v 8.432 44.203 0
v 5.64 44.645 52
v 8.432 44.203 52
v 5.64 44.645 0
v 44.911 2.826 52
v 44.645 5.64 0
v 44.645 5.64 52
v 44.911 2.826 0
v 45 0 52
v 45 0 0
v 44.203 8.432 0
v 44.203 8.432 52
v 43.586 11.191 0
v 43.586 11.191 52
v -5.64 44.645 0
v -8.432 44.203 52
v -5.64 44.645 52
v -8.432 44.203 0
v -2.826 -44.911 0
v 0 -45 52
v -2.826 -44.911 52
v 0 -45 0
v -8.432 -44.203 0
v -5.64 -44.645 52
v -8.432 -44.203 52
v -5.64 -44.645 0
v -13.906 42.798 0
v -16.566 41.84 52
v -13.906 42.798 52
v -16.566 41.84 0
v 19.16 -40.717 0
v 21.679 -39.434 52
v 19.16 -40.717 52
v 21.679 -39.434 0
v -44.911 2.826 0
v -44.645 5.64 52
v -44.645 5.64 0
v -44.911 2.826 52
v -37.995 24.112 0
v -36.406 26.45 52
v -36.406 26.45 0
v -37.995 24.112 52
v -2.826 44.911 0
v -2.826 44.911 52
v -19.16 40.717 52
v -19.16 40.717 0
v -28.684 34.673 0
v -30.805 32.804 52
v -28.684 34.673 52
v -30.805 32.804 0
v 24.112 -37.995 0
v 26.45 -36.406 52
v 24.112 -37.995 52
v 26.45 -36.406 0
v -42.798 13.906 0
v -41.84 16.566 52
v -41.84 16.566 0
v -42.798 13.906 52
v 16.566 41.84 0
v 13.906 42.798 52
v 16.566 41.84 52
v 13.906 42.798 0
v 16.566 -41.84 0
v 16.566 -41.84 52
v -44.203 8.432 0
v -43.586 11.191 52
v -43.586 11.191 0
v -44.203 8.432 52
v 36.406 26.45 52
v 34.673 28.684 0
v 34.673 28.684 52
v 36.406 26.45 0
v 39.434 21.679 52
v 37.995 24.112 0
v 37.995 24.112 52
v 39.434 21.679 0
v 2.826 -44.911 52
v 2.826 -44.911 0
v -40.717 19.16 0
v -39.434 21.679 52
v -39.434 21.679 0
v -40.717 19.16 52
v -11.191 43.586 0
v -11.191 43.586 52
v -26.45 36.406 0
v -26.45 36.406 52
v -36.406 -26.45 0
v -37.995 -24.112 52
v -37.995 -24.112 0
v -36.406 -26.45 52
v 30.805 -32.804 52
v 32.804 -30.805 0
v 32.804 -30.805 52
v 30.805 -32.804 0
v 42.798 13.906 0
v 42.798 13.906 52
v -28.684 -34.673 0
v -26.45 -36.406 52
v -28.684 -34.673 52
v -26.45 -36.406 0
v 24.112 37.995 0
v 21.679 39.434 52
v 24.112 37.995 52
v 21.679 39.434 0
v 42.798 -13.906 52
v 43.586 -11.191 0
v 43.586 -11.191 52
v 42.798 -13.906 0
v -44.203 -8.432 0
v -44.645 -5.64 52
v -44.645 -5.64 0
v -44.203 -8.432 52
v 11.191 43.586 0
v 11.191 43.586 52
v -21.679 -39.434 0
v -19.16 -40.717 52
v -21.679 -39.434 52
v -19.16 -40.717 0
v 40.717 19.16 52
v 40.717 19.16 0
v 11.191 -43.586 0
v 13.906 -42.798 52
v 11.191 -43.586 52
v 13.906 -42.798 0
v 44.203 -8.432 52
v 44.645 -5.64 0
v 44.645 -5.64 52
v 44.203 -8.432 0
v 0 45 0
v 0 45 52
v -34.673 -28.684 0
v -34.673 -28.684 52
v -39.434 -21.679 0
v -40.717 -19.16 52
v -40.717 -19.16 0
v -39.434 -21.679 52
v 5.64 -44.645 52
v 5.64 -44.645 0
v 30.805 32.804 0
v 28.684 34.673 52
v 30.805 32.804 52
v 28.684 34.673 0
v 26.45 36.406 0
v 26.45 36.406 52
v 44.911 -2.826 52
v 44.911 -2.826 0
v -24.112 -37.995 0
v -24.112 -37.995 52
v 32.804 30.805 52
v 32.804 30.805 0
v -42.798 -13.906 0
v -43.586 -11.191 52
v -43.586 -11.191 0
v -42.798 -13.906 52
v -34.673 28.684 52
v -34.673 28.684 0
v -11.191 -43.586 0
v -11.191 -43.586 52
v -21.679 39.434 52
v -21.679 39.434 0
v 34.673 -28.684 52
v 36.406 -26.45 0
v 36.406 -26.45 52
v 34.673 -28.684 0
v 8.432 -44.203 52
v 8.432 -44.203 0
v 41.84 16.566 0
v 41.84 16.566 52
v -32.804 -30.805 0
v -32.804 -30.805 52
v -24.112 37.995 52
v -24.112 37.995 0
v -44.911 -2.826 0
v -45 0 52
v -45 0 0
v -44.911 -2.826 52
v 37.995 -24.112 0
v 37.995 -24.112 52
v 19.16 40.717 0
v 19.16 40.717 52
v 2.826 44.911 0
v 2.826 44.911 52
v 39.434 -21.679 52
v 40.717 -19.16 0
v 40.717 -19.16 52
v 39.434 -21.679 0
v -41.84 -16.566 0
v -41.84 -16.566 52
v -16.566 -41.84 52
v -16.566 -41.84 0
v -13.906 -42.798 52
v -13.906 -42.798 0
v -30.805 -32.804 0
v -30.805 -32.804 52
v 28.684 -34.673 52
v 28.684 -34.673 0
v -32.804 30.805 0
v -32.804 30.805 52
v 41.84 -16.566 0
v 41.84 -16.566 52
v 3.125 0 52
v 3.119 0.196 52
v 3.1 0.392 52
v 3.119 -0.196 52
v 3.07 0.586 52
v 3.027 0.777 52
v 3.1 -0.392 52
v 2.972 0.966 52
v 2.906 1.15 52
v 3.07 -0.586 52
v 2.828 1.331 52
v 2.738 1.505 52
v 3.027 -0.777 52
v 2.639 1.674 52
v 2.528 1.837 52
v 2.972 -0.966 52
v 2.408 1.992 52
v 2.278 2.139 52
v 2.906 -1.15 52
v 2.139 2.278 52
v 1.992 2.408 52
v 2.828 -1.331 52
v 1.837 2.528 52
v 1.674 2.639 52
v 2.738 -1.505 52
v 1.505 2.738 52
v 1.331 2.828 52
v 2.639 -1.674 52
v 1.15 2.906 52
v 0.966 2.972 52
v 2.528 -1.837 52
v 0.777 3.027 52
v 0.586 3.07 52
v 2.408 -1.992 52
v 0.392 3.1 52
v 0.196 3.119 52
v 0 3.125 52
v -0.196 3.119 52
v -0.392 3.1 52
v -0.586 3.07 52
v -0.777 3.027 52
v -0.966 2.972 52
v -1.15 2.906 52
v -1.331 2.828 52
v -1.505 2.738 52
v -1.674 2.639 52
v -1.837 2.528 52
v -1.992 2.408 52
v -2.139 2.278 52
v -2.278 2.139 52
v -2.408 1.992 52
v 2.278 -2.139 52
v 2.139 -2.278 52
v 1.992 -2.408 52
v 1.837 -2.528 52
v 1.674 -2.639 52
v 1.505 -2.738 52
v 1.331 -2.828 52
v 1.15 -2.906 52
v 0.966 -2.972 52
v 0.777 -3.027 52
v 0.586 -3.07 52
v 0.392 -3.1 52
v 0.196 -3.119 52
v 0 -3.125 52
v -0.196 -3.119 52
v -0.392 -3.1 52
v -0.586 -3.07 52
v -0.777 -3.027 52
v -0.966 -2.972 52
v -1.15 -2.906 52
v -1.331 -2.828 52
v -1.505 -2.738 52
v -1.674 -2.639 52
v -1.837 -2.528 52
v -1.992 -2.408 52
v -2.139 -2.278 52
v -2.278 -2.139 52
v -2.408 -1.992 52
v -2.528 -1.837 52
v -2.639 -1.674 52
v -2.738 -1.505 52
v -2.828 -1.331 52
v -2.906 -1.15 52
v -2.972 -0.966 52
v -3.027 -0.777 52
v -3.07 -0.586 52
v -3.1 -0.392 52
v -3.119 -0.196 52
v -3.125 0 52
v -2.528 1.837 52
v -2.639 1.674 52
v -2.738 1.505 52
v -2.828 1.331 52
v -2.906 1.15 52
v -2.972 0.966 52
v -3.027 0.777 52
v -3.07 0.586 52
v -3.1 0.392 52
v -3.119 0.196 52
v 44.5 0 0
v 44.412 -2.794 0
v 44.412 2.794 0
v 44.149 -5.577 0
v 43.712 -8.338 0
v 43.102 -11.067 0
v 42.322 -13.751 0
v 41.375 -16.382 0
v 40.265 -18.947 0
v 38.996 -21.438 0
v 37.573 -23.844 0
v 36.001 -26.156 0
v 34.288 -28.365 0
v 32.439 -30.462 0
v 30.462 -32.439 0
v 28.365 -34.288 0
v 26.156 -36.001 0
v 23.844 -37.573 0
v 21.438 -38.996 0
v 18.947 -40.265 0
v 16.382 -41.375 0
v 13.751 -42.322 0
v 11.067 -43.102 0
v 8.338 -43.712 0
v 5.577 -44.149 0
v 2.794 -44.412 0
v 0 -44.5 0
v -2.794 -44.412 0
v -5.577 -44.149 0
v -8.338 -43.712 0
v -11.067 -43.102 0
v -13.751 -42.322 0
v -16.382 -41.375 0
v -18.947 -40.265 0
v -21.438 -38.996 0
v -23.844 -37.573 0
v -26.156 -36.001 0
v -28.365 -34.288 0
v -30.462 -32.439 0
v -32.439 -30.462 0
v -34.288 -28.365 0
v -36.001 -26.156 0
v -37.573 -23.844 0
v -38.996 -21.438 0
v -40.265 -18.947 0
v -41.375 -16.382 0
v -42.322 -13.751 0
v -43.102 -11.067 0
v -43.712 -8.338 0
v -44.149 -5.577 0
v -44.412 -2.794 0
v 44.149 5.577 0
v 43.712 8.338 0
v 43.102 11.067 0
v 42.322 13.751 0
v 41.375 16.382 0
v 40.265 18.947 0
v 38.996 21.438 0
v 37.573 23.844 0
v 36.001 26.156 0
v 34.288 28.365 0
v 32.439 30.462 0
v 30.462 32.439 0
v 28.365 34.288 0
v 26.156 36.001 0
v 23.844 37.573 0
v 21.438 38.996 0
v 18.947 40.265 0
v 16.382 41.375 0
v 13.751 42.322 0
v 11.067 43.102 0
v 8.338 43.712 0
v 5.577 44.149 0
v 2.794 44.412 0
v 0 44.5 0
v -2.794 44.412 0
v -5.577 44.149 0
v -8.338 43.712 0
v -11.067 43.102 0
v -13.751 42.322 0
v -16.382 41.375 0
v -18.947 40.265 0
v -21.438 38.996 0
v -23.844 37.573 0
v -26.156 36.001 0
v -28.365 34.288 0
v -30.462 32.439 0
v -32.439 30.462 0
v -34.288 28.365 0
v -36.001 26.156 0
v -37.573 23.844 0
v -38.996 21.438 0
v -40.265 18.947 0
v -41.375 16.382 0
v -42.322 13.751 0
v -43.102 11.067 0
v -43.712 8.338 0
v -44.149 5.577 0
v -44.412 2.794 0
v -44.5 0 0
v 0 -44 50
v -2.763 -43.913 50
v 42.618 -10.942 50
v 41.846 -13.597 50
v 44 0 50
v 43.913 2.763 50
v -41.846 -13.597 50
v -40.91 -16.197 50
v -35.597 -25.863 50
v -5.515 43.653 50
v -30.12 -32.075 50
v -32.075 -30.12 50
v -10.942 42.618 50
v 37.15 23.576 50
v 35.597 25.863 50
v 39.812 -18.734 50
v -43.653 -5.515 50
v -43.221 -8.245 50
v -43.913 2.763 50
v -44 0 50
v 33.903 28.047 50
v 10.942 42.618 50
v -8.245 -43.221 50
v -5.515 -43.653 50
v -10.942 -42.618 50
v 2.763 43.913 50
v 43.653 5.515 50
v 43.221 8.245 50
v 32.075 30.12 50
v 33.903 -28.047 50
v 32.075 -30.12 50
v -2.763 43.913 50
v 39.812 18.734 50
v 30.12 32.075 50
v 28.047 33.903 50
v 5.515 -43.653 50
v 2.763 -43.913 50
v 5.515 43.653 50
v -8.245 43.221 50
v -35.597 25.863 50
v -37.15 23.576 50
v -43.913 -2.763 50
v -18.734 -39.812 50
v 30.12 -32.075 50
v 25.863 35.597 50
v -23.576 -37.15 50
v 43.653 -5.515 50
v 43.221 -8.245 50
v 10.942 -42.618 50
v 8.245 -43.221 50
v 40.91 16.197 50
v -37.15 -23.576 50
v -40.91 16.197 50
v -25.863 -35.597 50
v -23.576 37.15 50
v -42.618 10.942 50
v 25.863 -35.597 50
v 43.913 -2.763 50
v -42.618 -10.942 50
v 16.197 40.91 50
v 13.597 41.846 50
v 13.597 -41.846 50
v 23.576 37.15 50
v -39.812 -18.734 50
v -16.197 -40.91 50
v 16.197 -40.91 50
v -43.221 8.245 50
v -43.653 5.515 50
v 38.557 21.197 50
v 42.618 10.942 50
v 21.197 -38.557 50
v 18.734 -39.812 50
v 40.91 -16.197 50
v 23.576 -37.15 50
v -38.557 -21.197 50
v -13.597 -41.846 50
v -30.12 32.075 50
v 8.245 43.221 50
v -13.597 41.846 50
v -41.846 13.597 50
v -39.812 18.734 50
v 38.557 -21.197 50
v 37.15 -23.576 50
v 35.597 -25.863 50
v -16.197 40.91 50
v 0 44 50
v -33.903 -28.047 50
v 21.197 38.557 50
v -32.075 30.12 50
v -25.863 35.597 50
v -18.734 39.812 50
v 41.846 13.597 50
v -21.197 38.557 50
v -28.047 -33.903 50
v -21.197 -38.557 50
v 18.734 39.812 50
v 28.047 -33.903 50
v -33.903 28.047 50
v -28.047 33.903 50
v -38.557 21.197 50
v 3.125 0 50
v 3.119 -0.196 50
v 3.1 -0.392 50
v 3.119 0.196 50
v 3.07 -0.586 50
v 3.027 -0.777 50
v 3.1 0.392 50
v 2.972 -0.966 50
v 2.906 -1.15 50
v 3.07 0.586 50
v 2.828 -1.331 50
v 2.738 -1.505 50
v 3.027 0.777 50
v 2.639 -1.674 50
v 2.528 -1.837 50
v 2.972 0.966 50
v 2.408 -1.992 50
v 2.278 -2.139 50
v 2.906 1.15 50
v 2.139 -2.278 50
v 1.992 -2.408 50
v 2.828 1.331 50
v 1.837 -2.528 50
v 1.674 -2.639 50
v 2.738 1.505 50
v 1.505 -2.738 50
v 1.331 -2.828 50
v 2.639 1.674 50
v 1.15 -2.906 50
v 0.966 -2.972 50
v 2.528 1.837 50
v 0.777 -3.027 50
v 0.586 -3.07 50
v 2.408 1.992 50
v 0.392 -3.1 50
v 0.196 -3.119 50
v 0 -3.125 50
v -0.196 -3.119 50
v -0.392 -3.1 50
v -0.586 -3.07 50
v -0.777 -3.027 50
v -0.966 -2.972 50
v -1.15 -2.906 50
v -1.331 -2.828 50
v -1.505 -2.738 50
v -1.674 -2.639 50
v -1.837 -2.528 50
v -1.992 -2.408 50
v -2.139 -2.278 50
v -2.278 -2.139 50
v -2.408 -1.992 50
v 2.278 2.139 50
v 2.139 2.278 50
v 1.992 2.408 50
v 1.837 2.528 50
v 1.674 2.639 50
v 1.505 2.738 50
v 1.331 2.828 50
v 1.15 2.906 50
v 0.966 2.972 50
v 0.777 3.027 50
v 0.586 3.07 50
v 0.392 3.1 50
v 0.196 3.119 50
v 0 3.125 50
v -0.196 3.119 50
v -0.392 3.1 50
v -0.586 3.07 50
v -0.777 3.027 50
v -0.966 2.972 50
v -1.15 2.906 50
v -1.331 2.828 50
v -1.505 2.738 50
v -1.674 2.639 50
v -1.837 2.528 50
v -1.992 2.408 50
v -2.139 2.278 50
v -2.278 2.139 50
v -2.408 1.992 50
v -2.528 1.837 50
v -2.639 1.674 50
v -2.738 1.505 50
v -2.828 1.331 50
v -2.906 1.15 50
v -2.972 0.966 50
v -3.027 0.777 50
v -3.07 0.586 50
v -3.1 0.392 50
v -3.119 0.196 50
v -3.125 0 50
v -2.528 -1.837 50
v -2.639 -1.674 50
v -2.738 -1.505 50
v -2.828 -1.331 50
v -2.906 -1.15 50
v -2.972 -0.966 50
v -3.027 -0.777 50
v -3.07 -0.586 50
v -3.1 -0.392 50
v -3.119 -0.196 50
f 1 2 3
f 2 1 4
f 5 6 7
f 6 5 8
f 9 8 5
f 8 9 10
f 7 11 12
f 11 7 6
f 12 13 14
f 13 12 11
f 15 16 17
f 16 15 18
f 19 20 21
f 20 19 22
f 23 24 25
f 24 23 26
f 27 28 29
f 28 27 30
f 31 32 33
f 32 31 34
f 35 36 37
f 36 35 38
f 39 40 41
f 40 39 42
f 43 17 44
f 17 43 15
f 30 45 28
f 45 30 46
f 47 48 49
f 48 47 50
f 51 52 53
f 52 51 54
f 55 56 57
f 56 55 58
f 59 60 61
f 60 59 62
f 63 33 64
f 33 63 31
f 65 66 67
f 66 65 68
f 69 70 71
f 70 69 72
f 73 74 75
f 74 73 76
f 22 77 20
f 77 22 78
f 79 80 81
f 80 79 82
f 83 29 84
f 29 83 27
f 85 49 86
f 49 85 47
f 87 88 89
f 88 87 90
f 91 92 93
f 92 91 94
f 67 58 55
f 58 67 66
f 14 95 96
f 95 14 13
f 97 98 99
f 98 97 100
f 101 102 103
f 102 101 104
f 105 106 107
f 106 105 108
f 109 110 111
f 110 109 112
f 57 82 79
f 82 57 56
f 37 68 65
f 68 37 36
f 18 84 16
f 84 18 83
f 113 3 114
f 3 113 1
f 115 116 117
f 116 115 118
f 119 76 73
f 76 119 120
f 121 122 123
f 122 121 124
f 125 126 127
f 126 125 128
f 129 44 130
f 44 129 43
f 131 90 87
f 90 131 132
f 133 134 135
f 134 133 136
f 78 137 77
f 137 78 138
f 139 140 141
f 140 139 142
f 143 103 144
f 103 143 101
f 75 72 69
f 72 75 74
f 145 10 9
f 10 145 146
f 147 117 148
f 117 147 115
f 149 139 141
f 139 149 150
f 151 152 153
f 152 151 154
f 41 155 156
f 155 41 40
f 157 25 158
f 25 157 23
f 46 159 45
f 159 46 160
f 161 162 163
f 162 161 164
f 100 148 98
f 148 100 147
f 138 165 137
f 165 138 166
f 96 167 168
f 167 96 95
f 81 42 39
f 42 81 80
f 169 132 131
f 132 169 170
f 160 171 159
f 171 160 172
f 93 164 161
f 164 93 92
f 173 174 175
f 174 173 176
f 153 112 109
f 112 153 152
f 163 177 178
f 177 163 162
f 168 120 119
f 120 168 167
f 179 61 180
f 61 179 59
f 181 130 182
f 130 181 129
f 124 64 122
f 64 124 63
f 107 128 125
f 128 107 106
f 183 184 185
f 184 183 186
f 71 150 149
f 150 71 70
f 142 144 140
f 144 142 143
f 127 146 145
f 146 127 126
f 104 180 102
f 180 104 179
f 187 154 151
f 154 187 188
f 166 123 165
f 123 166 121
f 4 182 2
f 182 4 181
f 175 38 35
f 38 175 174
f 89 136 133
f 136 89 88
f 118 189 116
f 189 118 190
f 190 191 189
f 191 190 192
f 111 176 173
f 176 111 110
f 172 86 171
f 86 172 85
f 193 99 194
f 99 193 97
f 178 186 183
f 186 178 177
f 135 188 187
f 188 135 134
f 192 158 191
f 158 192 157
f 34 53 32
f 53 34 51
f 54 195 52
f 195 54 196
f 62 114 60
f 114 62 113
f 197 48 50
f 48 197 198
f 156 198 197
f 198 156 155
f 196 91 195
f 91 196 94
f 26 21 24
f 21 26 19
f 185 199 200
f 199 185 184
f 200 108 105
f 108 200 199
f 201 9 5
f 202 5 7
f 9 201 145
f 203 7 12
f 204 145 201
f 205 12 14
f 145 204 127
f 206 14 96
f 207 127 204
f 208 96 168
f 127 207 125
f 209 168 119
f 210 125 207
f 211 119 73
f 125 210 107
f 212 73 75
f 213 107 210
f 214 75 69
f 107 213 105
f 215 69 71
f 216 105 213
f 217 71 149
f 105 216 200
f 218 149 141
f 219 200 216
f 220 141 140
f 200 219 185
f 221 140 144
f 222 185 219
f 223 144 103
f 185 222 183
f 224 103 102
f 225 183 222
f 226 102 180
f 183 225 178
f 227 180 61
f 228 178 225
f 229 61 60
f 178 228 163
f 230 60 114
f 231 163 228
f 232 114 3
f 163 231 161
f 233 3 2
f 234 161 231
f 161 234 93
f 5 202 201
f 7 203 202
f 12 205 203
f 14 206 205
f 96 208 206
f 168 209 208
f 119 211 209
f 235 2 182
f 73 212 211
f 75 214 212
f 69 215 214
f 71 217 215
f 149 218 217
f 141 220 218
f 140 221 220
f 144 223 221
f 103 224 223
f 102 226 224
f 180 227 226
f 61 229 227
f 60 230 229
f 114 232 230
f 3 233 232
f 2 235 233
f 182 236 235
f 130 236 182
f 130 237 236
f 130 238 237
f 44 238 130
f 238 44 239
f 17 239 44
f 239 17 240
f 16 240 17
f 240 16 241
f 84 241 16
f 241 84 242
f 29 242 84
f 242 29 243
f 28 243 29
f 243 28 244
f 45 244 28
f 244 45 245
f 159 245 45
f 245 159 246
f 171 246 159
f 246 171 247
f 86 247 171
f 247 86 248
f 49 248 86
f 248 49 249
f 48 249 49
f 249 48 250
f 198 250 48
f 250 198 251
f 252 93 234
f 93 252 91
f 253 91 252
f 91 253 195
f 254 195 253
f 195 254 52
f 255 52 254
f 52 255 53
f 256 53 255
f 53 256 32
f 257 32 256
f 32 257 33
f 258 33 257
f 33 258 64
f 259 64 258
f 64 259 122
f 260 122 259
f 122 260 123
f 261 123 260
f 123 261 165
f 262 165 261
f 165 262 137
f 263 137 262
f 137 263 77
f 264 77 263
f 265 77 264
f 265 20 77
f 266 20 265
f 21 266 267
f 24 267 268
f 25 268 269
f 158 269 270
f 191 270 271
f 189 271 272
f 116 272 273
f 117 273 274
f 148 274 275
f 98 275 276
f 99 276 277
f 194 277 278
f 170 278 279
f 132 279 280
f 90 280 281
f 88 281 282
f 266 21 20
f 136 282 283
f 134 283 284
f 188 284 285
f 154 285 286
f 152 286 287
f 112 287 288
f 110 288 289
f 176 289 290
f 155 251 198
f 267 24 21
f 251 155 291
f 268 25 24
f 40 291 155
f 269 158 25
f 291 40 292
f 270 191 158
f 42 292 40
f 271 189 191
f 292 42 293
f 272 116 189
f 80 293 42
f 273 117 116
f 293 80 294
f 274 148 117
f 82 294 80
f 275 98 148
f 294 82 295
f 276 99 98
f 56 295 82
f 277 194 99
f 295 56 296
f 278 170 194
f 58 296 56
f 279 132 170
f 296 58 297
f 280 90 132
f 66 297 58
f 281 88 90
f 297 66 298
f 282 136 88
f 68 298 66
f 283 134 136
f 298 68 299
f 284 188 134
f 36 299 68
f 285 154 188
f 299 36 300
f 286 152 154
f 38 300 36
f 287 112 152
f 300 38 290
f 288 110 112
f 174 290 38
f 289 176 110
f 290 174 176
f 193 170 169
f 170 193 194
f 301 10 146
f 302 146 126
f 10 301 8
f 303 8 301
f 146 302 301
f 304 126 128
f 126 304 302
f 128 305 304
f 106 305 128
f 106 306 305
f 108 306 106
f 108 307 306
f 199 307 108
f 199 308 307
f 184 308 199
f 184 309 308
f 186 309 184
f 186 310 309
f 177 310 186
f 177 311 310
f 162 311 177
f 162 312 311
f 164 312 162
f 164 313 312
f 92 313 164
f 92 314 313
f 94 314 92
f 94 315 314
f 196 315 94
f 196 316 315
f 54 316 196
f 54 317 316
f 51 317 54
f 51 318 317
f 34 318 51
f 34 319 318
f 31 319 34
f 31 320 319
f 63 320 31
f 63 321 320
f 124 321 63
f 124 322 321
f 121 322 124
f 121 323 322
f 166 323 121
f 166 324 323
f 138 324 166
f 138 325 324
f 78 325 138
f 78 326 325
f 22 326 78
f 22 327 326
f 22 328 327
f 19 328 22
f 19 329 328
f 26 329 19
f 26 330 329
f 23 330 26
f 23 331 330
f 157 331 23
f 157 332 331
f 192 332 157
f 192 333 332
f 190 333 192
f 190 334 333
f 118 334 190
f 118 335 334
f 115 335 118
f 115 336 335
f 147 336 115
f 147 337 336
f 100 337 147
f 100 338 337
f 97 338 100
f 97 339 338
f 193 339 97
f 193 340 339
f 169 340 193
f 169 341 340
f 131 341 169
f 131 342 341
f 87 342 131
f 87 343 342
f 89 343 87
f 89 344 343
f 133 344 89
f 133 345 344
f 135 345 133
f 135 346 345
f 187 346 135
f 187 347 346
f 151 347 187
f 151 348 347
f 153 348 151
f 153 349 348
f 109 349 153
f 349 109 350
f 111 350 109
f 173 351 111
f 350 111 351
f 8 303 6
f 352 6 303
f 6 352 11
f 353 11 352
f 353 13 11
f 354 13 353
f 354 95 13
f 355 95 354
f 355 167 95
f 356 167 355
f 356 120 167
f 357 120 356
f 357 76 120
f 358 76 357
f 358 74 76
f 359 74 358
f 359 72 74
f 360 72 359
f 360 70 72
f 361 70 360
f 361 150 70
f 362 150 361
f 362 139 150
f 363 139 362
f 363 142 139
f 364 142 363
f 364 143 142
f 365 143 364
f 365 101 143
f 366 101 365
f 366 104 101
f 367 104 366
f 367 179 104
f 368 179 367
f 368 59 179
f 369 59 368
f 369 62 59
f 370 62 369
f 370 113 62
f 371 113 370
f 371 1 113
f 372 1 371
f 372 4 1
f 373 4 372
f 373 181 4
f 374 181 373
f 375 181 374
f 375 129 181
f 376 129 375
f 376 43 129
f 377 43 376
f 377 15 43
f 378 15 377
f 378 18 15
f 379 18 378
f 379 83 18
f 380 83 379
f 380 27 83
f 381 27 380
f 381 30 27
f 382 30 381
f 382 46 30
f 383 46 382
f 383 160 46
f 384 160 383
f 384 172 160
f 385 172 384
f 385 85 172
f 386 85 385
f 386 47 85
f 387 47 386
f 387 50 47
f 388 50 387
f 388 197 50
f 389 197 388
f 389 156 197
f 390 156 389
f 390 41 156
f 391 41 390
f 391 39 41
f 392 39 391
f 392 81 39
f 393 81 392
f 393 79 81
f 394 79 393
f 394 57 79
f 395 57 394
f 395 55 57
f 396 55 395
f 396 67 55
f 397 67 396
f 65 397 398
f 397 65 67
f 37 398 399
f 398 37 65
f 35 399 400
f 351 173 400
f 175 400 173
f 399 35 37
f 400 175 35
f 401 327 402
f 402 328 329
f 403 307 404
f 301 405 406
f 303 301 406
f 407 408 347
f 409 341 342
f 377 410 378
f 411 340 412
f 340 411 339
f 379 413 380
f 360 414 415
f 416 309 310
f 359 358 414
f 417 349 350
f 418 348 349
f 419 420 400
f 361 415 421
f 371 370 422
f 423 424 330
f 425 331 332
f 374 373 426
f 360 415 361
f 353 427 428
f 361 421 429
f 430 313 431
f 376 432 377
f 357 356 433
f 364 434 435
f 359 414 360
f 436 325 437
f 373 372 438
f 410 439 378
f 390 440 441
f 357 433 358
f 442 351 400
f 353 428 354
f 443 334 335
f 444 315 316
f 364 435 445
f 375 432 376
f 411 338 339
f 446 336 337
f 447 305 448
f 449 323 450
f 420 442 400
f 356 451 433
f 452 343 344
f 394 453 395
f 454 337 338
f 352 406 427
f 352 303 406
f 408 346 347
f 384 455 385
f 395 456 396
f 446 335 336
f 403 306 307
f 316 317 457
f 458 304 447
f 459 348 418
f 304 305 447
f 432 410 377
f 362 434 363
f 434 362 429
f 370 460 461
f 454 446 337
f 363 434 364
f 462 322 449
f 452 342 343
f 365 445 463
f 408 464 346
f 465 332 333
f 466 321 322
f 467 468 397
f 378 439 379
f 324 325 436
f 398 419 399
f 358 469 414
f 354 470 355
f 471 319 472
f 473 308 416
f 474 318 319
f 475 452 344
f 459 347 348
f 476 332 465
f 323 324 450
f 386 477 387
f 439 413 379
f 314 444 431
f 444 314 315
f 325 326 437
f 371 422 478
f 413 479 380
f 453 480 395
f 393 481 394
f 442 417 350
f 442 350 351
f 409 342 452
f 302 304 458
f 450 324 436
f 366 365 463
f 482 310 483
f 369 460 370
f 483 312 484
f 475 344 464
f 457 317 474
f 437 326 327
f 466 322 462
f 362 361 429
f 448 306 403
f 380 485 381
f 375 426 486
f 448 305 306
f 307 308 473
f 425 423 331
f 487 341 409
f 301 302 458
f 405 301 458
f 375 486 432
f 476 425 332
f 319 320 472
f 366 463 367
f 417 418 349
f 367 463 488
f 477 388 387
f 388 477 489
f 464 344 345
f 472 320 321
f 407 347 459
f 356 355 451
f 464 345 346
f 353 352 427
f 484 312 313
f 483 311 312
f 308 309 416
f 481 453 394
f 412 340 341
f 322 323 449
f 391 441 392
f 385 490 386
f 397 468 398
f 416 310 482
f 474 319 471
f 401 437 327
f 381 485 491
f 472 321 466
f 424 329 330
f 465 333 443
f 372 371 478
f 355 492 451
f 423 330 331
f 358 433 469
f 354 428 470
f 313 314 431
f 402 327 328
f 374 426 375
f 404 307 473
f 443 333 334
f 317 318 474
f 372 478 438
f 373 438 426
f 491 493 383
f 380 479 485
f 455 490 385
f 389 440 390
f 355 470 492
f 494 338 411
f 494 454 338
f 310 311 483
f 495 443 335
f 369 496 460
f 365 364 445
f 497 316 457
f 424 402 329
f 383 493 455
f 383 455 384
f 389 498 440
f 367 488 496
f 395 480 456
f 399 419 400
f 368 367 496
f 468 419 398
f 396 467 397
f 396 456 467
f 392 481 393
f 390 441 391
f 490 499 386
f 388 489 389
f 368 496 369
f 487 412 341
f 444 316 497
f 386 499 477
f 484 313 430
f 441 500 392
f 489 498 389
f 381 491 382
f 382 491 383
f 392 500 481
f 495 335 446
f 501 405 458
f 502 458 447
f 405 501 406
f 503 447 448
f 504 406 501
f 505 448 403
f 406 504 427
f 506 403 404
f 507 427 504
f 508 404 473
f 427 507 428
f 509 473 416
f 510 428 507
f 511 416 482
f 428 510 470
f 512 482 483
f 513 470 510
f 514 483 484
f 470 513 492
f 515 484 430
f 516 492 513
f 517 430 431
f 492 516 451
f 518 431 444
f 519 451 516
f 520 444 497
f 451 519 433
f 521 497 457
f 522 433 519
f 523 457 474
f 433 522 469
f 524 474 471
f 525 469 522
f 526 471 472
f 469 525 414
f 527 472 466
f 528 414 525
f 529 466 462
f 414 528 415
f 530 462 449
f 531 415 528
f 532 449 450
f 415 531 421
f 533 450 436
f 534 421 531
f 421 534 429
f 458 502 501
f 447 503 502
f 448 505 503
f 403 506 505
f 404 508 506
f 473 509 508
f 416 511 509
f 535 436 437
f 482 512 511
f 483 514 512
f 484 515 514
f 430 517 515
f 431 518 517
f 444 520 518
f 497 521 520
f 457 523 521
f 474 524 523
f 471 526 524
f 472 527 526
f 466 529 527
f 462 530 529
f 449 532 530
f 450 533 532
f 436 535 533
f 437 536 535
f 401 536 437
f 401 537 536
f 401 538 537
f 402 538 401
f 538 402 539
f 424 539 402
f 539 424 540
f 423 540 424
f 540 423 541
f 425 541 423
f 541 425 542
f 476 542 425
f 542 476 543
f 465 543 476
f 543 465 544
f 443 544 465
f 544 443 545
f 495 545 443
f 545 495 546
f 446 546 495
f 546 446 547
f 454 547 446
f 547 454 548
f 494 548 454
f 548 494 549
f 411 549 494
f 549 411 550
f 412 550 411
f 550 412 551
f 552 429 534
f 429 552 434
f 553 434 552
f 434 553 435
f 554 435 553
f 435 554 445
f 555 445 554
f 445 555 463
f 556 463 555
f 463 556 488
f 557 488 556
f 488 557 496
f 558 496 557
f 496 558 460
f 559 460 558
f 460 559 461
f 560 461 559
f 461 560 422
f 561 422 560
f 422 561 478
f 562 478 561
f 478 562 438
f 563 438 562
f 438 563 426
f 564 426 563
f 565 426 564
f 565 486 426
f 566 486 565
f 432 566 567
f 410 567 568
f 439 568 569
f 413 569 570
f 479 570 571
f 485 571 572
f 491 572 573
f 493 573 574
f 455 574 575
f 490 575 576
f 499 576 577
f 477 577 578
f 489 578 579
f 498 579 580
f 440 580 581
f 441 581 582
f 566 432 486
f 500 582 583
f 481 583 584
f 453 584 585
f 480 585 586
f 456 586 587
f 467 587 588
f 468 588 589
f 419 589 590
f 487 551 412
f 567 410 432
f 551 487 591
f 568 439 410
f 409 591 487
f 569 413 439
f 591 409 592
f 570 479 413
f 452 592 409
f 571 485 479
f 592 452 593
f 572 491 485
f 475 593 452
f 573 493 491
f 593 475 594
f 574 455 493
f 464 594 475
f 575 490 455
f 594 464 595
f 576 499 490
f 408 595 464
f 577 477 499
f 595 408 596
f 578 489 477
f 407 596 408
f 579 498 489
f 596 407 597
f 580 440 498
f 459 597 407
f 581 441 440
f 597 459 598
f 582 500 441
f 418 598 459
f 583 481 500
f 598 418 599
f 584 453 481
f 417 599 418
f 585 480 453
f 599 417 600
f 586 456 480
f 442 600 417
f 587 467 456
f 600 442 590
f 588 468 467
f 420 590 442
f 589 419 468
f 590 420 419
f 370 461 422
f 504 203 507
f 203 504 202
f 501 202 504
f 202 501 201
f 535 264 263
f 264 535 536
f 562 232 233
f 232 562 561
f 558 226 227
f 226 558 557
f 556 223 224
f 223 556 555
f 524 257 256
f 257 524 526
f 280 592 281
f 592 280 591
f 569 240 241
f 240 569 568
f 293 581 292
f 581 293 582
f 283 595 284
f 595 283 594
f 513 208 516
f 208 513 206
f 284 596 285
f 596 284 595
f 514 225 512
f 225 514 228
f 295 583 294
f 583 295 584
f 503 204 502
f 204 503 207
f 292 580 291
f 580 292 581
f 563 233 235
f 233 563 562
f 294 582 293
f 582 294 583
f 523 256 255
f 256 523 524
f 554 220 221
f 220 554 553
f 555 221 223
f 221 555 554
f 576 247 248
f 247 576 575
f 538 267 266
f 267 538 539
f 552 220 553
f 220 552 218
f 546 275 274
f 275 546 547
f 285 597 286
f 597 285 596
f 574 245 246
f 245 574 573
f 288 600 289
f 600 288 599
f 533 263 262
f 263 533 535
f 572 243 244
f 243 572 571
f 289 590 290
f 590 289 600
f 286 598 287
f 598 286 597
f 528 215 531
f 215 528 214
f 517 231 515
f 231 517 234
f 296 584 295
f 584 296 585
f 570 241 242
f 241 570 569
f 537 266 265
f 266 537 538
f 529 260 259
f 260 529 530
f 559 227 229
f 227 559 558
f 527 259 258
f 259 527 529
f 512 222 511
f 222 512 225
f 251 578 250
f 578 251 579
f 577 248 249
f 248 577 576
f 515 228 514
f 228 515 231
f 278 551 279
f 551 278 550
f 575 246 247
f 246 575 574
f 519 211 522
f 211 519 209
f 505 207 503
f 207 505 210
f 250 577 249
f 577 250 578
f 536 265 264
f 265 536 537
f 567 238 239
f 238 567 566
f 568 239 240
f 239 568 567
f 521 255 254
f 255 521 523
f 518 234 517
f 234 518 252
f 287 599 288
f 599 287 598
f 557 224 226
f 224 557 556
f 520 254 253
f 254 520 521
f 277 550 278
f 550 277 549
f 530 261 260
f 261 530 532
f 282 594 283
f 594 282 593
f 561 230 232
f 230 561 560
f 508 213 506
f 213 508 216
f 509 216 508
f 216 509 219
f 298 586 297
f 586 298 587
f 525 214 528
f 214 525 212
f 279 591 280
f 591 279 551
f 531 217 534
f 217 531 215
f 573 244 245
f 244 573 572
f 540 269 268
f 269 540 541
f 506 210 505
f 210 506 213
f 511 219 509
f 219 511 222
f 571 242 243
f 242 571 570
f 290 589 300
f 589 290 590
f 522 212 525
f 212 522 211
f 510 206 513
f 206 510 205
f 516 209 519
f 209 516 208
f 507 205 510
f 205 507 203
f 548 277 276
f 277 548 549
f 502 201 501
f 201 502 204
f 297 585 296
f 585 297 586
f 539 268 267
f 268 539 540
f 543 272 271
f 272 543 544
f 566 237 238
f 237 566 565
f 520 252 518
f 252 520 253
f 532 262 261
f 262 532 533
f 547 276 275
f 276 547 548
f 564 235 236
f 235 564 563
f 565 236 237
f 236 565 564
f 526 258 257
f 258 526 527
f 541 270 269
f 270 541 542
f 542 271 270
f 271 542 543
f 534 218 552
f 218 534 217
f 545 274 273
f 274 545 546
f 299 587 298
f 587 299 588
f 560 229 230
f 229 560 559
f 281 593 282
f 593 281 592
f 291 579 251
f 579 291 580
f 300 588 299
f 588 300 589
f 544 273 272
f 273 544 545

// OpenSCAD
//translate([0, 0, -141]){
//    import("/home/bugger/Documents/Thuis/3d_printer/sword/LoZ_Sword_Guard.stl");
//    import("/home/bugger/Documents/Thuis/3d_printer/sword/LoZ_Sword_Pommel.stl");
//    import("/home/bugger/Documents/Thuis/3d_printer/sword/LoZ_Sword_Grip.stl");
//}

$fn=100;
diameter_bar = 6.25;
diameter_2_diploma_case = 88;
thickness_diploma_case = 2;
diameter_1_diploma_case = diameter_2_diploma_case + 1;
height_diploma_case = 50;
difference() {
    cylinder(h = height_diploma_case + thickness_diploma_case, d = diameter_2_diploma_case + thickness_diploma_case);
    cylinder(h = height_diploma_case, d1 = diameter_1_diploma_case, d2 = diameter_2_diploma_case);
    cylinder(h = 2*height_diploma_case, d = diameter_bar);
}

//import("/home/bugger/Documents/Thuis/3d_printer/sword/LoZ_Sword_Gem.stl");
